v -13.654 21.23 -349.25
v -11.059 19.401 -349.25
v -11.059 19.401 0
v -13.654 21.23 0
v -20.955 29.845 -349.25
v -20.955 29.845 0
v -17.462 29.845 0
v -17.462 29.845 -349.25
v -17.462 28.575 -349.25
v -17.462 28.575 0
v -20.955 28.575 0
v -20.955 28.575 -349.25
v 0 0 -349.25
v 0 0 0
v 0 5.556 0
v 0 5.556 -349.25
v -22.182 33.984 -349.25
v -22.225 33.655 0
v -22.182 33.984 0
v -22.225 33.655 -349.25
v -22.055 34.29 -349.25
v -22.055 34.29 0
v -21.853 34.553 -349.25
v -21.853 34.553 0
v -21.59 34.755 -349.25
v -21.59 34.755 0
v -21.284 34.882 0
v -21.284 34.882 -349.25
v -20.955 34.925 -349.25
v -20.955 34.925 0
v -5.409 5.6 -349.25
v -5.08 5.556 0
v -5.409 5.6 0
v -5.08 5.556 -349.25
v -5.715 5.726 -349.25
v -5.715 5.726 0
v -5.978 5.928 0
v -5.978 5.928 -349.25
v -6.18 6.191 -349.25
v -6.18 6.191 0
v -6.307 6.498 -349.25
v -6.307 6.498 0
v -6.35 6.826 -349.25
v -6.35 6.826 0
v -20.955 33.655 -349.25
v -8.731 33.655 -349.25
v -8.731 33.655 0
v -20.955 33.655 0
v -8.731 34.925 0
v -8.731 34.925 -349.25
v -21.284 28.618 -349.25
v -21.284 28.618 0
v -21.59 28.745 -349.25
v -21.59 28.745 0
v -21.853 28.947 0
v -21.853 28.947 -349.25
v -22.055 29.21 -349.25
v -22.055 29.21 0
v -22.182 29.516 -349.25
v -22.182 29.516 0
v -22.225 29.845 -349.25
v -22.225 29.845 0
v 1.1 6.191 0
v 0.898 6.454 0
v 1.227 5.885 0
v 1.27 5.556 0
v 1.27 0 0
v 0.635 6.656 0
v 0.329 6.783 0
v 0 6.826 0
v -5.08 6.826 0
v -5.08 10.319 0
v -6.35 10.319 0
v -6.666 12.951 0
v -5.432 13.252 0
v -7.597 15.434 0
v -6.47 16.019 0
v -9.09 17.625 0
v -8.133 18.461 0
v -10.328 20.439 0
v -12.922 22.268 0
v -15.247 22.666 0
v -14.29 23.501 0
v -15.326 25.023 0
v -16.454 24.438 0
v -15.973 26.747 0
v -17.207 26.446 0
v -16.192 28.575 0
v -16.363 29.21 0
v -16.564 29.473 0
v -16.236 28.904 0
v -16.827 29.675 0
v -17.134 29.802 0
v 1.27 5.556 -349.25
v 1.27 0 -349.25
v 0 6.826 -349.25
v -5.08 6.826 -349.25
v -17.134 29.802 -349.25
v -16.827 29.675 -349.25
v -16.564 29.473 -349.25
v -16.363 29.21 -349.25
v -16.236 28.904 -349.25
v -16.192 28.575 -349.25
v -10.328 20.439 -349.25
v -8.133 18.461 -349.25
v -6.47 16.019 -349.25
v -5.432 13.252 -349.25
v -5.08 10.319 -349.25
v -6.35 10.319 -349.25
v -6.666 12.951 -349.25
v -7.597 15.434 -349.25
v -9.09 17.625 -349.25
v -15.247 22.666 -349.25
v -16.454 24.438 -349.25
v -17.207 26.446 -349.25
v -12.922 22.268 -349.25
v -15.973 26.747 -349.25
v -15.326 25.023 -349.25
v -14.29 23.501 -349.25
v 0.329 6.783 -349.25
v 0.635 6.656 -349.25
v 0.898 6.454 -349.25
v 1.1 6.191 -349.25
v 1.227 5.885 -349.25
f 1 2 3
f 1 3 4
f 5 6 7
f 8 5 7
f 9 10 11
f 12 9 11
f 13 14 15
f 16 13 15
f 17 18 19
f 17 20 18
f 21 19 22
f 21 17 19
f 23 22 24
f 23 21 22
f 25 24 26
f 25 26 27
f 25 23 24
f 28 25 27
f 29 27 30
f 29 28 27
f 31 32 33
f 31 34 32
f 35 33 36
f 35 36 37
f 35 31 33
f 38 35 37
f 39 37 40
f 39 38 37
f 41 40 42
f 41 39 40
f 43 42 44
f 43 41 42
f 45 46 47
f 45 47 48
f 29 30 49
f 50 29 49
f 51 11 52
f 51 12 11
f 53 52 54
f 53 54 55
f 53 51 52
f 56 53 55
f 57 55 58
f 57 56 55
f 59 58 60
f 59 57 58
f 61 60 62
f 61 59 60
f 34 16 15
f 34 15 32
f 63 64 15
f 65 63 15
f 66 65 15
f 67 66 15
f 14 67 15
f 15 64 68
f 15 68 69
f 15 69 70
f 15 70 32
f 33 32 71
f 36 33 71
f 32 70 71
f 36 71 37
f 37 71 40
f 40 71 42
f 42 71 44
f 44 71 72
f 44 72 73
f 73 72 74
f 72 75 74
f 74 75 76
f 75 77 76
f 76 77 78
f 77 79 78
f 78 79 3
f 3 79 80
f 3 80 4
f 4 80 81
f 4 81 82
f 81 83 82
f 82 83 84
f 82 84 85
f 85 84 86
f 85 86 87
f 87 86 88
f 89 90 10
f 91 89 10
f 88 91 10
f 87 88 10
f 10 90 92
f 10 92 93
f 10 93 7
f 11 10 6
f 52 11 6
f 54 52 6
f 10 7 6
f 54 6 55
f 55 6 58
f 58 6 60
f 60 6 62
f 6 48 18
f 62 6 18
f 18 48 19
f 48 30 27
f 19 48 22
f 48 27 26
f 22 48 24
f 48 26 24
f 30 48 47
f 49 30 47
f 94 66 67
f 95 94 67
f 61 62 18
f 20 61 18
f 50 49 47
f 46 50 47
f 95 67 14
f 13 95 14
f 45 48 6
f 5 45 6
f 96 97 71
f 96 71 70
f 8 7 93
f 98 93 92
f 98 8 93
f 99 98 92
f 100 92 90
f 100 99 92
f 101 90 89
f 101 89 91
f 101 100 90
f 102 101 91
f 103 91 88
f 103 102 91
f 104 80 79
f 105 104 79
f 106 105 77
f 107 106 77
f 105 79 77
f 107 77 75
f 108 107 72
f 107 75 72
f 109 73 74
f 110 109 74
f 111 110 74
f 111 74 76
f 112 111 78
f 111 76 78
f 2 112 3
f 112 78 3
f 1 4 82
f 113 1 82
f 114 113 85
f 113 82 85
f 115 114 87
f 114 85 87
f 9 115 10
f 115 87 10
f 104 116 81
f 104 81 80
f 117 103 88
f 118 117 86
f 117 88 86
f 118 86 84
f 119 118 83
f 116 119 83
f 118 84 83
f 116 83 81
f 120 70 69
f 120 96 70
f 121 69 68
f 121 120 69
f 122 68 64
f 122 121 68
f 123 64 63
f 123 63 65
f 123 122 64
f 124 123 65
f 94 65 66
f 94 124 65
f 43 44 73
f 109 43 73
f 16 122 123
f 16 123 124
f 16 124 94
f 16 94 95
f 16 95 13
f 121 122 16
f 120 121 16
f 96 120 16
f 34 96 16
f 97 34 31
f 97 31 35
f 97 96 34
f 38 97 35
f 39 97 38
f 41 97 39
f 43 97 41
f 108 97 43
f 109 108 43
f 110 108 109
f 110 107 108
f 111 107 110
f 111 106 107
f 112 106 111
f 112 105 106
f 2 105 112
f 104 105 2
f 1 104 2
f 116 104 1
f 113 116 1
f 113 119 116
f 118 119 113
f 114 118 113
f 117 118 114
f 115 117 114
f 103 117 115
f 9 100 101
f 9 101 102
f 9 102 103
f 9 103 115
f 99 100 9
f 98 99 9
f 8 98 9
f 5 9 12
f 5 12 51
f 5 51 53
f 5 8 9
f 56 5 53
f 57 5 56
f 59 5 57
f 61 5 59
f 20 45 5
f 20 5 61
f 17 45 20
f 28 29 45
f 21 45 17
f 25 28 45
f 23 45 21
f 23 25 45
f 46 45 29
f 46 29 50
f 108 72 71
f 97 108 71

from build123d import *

# Parameters (mm, degrees)
EXTRUDE_THIN1_DEPTH = 349.25
FILLET1_R           = 1.27


with BuildPart() as part:
    # Sketch1 → Extrude-Thin1 (new body)
    with BuildSketch(Plane.XY):
        with BuildLine():
            Line((0, 0), (0, 5.55625))
            Line((0, 5.55625), (-6.35, 5.55625))
            Line((-6.35, 5.55625), (-6.35, 10.31875))
            ThreePointArc((-6.35, 10.31875), (-7.597327769, 15.43402449), (-11.059297297, 19.400966216))
            Line((-11.059297297, 19.400966216), (-13.654216216, 21.230452703))
            ThreePointArc((-13.654216216, 21.230452703), (-16.453819125, 24.438413231), (-17.4625, 28.575))
            Line((-17.4625, 28.575), (-22.225, 28.575))
            Line((-22.225, 28.575), (-22.225, 34.925))
            Line((-22.225, 34.925), (-8.73125, 34.925))
            Line((-8.73125, 34.925), (-8.73125, 33.655))
            Line((-8.73125, 33.655), (-20.955, 33.655))
            Line((-20.955, 33.655), (-20.955, 29.845))
            Line((-20.955, 29.845), (-16.087271104, 29.845))
            ThreePointArc((-16.087271104, 29.845), (-15.596279625, 25.600802309), (-12.922421622, 22.26842027))
            Line((-12.922421622, 22.26842027), (-10.327502703, 20.438933784))
            ThreePointArc((-10.327502703, 20.438933784), (-6.469879514, 16.018627289), (-5.08, 10.31875))
            Line((-5.08, 10.31875), (-5.08, 6.82625))
            Line((-5.08, 6.82625), (1.27, 6.82625))
            Line((1.27, 6.82625), (1.27, 0))
            Line((1.27, 0), (0, 0))
        make_face()
    extrude(amount=-EXTRUDE_THIN1_DEPTH)

    # Fillet1
    fillet1_edges = [part.edges().sort_by_distance(p)[0] for p in [
        (-16.087271104, 29.845, -174.625),
        (1.27, 6.82625, -174.625),
        (-6.35, 5.55625, -174.625),
        (-22.225, 28.575, -174.625),
        (-22.225, 34.925, -174.625),
    ]]
    fillet(fillet1_edges, radius=FILLET1_R)


solid = part.part
